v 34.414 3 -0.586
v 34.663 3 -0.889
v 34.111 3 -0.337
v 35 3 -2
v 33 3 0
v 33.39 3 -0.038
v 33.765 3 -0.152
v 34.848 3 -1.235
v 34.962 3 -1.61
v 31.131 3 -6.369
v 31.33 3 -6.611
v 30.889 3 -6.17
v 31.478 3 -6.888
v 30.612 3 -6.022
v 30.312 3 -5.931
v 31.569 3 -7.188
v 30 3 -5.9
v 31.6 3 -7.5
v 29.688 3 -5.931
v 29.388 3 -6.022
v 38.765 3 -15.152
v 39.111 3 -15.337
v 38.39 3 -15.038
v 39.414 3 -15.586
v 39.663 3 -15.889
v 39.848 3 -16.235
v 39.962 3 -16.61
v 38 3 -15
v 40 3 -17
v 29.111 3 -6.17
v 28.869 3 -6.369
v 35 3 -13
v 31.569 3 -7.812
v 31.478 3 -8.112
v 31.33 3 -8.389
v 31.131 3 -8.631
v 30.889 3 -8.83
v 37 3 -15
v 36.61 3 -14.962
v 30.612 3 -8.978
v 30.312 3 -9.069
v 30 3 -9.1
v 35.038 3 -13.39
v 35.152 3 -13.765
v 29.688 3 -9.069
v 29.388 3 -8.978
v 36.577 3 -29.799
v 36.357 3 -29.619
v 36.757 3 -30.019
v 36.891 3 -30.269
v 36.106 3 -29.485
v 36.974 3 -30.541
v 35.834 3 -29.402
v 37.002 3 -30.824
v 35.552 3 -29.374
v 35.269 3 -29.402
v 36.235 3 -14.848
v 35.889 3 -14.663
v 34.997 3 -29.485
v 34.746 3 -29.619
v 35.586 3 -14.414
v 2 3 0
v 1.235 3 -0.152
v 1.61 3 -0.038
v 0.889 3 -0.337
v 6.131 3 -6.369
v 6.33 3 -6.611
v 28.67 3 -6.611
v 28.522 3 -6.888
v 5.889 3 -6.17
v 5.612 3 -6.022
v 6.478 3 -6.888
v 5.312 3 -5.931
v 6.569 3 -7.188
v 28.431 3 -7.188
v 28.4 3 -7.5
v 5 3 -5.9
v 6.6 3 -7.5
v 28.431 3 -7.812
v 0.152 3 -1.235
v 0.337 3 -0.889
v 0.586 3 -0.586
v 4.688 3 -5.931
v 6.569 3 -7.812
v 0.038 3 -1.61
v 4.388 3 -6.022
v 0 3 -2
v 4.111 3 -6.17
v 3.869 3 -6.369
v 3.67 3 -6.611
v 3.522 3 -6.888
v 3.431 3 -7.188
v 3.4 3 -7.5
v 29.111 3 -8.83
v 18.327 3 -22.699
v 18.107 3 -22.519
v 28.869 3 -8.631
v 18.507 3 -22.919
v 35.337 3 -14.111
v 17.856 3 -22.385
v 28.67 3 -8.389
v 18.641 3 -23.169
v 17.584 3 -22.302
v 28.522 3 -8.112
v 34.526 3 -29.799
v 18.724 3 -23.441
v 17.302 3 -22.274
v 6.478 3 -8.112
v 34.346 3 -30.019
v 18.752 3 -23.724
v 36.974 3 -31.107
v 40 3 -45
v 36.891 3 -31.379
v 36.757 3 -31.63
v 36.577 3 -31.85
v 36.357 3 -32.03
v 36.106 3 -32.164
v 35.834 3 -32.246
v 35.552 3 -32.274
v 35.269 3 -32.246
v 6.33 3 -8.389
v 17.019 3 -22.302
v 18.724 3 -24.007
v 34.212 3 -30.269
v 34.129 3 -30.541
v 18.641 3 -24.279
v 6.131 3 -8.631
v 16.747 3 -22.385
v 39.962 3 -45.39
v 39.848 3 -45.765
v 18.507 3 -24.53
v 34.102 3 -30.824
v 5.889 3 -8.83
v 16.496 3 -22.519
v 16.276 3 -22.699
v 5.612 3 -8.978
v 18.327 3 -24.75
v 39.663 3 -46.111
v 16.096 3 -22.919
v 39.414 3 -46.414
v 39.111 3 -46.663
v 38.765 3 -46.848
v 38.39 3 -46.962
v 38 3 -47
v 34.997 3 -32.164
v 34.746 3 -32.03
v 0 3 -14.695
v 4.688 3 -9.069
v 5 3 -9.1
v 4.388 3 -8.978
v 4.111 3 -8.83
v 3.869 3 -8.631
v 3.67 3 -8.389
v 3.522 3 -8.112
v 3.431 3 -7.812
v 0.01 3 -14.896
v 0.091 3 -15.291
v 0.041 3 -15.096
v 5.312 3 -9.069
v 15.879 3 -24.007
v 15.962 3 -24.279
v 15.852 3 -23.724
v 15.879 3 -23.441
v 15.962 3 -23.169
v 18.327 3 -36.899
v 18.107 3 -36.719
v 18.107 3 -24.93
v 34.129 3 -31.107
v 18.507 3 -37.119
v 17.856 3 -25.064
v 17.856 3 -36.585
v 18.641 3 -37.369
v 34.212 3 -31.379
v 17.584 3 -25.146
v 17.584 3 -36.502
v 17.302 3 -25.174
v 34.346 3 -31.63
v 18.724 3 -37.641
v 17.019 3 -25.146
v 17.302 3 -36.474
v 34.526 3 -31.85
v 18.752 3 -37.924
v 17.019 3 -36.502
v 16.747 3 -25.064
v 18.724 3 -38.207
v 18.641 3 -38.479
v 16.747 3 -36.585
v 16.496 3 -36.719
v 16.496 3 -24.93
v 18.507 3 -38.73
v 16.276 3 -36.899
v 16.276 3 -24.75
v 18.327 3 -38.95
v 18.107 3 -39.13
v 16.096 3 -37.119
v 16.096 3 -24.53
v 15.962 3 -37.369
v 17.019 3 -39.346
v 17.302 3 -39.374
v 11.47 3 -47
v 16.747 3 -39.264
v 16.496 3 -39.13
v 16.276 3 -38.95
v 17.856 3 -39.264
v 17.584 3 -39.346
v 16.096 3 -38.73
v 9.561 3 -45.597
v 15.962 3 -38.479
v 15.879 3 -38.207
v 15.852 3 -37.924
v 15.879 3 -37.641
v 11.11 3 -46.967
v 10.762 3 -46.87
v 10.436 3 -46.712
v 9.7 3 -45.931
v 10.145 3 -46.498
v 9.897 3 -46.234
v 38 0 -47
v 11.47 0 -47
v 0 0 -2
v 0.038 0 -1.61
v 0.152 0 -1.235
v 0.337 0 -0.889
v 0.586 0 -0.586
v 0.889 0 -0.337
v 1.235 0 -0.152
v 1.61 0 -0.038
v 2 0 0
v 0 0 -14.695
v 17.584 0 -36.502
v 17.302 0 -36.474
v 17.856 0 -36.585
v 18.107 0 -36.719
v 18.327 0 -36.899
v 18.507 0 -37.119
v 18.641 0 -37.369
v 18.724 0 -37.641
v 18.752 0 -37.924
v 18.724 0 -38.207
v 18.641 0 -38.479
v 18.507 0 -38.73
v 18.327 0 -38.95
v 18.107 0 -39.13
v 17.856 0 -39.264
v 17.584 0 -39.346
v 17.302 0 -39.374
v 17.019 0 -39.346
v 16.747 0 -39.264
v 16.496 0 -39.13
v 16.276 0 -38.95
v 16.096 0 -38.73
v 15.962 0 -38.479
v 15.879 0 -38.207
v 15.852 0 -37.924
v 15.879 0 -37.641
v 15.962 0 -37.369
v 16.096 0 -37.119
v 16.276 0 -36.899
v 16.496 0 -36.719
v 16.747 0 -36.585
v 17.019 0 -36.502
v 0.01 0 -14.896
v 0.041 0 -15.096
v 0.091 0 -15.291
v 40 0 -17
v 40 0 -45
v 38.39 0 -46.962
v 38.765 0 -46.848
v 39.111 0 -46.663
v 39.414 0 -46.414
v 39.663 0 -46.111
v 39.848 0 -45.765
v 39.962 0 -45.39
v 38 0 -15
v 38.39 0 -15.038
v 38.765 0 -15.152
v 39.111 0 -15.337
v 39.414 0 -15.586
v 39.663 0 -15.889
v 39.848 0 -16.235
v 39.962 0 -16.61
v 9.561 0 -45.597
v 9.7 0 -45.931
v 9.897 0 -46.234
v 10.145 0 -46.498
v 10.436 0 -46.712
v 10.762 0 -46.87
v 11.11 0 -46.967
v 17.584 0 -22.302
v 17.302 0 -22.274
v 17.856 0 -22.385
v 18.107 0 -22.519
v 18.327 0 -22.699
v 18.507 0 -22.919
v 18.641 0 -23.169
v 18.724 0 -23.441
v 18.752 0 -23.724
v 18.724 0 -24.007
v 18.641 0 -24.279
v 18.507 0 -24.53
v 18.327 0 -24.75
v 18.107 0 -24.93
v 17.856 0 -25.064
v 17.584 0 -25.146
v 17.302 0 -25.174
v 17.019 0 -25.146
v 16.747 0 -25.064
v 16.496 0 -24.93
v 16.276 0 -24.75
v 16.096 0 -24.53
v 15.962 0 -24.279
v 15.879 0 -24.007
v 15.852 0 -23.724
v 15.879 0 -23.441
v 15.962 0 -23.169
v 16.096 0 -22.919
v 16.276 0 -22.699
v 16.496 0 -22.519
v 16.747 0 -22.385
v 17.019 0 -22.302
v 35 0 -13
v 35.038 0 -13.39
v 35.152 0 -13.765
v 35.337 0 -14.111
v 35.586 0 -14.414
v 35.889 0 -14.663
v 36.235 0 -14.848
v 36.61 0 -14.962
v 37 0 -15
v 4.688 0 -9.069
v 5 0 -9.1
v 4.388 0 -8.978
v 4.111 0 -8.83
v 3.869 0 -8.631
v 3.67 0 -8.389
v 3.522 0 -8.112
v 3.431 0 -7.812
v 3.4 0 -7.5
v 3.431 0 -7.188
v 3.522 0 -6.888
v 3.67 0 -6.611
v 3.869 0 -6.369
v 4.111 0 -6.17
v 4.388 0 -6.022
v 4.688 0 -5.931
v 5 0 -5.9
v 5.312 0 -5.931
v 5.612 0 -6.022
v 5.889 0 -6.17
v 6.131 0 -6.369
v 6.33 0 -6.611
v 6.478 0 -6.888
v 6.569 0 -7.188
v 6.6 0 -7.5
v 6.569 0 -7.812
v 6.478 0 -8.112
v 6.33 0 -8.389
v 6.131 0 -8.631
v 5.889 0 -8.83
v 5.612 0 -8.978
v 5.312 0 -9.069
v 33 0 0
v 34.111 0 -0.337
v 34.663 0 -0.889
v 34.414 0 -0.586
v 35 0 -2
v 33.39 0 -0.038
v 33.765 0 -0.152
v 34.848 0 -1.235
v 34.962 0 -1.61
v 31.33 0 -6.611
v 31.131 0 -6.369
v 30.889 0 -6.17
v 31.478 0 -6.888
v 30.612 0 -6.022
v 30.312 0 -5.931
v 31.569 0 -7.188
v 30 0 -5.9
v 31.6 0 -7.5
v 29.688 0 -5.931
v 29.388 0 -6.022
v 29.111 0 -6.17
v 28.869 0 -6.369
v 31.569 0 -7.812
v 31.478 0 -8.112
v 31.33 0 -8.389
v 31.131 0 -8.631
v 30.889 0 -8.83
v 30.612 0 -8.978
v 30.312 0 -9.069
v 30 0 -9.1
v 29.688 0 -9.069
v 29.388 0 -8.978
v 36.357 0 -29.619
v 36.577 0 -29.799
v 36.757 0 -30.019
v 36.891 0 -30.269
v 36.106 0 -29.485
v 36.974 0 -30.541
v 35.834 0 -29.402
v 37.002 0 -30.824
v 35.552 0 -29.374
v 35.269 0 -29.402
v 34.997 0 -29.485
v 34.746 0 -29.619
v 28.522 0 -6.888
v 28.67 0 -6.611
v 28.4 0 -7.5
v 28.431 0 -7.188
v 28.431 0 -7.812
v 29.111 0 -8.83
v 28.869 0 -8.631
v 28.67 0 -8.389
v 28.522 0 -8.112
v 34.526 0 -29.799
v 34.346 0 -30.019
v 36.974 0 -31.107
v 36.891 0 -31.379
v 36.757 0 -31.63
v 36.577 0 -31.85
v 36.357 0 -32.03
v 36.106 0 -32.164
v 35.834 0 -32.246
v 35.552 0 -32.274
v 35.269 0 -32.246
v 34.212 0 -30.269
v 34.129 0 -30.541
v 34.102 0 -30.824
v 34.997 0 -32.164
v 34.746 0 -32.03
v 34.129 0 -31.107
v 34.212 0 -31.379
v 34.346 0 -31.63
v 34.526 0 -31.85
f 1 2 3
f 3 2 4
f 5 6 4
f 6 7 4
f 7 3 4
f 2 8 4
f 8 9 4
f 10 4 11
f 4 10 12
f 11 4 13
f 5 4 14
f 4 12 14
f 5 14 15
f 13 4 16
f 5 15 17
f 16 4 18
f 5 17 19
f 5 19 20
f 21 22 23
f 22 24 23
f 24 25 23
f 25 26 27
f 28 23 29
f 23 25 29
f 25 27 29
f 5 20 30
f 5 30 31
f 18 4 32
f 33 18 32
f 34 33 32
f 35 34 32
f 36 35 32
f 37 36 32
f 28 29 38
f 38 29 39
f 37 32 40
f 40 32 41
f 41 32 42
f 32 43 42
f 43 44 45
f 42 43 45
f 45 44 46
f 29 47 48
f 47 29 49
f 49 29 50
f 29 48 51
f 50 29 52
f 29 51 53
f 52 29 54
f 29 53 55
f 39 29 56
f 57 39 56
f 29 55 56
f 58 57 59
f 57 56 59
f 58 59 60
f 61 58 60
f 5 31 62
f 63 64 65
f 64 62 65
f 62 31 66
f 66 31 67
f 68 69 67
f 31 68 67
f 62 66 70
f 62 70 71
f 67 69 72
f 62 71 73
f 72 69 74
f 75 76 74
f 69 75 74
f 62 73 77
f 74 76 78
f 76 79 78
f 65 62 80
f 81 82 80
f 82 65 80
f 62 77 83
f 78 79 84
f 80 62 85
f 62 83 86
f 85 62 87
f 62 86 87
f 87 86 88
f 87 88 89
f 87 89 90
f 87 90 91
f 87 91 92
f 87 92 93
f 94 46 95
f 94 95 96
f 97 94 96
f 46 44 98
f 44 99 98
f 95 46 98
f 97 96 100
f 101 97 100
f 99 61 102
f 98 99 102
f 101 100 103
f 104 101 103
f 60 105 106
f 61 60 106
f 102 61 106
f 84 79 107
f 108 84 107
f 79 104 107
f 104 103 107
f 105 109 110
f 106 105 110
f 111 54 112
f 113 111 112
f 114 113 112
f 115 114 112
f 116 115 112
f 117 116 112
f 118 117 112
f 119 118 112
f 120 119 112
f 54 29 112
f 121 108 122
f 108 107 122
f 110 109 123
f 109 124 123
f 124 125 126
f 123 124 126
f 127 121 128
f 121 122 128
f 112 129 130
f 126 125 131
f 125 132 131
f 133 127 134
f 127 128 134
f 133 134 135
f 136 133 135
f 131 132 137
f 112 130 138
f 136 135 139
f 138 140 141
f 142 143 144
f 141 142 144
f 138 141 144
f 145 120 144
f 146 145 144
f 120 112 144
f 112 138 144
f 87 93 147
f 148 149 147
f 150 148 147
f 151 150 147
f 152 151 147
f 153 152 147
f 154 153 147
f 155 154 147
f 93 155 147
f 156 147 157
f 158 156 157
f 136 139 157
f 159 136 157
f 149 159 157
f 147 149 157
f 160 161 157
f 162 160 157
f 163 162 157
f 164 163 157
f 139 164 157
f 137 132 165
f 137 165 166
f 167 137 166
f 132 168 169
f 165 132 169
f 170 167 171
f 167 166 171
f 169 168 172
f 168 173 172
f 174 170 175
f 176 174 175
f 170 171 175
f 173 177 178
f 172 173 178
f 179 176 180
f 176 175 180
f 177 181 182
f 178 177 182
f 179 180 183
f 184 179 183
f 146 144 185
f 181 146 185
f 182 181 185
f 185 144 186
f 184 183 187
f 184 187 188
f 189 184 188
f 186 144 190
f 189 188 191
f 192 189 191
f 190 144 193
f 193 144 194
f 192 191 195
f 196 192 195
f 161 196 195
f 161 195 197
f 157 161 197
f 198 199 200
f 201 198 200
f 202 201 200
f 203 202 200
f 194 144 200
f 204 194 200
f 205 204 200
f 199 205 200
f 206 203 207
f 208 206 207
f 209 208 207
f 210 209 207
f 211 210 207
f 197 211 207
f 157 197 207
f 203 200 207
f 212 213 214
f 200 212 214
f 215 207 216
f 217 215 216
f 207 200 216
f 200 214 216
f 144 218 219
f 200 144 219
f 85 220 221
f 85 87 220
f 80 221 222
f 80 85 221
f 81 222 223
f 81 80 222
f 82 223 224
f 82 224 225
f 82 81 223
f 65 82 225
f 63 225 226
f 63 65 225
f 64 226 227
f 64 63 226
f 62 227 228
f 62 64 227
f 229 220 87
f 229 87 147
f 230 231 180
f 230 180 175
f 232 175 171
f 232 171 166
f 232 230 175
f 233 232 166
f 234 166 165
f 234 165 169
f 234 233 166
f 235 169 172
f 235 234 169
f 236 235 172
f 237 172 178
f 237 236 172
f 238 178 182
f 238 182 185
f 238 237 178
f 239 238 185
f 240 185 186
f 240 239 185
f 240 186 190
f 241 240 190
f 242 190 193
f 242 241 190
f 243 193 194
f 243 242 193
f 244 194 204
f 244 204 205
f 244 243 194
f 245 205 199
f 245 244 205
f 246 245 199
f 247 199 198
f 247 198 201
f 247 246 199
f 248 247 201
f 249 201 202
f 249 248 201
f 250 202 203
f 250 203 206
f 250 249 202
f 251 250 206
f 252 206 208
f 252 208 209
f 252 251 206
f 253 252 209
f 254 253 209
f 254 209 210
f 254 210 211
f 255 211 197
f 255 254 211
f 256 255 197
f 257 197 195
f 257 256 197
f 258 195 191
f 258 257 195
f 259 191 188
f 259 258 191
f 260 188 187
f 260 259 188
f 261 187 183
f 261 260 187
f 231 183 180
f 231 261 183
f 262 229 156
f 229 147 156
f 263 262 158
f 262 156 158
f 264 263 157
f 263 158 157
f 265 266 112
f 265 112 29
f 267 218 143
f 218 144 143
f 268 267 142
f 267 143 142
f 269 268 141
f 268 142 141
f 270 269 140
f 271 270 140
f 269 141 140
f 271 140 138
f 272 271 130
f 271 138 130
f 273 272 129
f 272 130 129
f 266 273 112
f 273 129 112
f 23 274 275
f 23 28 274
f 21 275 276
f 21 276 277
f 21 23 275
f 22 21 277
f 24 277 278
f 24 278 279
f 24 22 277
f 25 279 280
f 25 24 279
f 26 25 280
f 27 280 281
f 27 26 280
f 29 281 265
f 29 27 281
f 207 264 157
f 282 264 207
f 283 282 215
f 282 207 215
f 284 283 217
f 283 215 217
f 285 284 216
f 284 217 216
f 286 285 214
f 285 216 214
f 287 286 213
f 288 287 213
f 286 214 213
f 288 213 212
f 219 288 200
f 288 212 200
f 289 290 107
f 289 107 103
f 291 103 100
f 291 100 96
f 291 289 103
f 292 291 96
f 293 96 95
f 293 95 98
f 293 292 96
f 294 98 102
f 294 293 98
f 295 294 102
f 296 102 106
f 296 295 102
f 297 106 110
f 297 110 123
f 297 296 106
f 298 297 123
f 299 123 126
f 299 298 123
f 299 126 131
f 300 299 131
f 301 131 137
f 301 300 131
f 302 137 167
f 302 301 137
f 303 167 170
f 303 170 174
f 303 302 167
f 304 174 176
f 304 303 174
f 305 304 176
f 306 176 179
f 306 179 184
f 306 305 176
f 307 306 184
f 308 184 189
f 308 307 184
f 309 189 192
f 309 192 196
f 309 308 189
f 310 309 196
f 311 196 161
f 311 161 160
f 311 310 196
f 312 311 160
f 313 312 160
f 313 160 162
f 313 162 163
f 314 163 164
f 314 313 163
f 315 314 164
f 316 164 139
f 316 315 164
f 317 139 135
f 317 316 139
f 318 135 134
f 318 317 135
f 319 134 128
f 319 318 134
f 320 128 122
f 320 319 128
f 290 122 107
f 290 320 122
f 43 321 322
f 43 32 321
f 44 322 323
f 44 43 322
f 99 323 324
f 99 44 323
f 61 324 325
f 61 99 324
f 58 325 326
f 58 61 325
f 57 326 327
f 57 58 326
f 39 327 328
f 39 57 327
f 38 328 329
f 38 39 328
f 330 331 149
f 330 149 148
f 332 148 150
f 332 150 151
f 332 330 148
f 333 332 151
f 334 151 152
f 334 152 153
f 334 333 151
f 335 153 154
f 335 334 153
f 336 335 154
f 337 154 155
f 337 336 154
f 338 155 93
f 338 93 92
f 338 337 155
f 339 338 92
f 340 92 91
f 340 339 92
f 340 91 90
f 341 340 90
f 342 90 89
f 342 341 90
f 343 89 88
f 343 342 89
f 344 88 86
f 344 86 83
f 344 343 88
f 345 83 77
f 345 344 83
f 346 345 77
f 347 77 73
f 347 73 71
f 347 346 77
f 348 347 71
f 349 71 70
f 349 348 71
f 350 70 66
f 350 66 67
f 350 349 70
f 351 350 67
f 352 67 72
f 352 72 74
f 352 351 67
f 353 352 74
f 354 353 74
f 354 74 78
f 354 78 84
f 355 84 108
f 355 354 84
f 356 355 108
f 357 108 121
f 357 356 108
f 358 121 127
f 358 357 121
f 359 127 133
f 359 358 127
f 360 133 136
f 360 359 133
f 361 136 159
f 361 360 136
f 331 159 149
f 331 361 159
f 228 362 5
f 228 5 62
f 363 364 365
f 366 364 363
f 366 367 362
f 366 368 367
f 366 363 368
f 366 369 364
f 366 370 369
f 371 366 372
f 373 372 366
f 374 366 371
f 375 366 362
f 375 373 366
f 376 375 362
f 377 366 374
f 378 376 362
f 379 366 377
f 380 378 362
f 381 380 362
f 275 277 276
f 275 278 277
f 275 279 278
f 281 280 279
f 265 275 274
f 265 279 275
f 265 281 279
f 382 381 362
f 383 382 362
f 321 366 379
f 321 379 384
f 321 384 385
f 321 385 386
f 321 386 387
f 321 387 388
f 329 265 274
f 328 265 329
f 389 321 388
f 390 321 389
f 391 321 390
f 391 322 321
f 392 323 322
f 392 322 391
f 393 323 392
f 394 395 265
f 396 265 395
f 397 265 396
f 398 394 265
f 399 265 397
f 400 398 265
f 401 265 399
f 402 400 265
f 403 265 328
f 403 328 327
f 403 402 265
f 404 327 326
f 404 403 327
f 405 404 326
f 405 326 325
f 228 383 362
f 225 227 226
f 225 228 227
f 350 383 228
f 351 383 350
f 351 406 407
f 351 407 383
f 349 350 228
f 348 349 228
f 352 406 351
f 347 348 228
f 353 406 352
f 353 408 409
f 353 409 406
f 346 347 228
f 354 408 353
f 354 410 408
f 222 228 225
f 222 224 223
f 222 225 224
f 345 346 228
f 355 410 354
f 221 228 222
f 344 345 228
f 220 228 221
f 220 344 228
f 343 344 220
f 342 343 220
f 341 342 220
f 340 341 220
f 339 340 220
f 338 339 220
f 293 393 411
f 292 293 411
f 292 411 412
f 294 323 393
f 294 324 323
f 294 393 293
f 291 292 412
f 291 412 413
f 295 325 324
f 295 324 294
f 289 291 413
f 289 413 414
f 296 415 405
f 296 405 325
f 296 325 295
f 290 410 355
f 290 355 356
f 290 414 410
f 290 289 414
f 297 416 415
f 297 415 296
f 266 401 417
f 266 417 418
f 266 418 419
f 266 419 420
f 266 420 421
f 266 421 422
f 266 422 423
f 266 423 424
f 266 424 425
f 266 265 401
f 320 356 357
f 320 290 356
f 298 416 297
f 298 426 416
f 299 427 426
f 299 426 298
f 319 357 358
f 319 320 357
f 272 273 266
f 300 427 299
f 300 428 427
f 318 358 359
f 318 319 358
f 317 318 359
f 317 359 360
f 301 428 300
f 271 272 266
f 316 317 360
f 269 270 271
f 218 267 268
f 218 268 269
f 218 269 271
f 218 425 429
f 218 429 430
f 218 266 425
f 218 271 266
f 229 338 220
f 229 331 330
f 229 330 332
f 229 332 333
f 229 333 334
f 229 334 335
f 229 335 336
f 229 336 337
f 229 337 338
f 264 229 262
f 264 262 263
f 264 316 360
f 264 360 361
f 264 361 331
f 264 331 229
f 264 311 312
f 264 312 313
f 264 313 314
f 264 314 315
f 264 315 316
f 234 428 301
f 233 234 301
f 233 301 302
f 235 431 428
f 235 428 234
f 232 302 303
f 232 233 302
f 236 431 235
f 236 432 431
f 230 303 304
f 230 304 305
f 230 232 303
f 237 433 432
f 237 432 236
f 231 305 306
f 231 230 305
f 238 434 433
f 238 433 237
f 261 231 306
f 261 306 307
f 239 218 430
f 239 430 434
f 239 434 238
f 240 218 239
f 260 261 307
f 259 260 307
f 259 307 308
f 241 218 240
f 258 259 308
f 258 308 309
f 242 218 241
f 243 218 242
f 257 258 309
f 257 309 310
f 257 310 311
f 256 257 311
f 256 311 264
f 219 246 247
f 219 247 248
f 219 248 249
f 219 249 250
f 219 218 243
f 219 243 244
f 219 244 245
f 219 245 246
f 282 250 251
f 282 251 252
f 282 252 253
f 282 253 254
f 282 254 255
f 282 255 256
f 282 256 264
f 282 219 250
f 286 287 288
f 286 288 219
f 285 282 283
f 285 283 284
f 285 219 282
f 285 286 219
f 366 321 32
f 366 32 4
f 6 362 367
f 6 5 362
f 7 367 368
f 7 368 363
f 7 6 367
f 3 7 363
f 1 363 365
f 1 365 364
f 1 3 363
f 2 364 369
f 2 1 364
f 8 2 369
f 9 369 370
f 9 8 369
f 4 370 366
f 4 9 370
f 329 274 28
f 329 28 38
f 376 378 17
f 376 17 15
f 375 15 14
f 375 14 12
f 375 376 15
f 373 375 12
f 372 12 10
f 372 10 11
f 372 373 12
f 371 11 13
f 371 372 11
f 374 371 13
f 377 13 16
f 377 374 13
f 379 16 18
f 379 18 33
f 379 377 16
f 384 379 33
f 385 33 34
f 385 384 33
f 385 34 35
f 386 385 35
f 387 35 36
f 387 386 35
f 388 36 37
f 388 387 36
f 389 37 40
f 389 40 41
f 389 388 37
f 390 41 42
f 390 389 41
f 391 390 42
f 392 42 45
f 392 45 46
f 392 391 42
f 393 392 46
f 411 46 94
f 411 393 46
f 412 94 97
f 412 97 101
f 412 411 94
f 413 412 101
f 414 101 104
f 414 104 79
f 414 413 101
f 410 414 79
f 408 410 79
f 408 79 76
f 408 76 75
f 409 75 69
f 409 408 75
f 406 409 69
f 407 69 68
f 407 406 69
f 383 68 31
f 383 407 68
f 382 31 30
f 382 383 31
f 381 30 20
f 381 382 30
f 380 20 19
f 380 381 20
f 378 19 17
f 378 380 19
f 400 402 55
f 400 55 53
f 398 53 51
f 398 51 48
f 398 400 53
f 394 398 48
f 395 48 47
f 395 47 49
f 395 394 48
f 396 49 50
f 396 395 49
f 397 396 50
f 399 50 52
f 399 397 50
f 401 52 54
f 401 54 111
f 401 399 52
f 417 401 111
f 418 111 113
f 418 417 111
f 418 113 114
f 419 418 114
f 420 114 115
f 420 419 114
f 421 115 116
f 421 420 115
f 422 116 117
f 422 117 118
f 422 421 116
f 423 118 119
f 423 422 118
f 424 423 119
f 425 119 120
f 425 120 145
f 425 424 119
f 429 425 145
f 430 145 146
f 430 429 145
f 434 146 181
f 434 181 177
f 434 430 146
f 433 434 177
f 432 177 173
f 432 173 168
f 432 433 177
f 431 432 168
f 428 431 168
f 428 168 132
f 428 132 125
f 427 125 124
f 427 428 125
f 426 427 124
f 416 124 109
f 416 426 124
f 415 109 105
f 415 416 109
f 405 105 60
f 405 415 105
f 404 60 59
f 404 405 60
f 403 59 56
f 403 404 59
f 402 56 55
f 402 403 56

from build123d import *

# Parameters (mm, degrees)
SKETCH_1_R      = 1.6
SKETCH_1_R_2    = 1.45
EXTRUDE_1_DEPTH = 3
FILLET_2_R      = 2


with BuildPart() as part:
    # 草图1 → 凸台-拉伸1 (new body)
    with BuildSketch(Plane(origin=(0, 0, 0), x_dir=(1, 0, 0), z_dir=(0, 1, 0))):
        Polygon((0, 0), (0, 15), (10, 47), (25, 47), (40, 47), (40, 15), (35, 15), (35, 0), align=None)
        with Locations(Location((30, 7.5, 0), (0, 0, 270))):
            Circle(SKETCH_1_R, mode=Mode.SUBTRACT)
        with Locations(Location((5, 7.5, 0), (0, 0, 90))):
            Circle(SKETCH_1_R, mode=Mode.SUBTRACT)
        with Locations(Location((35.551575044, 30.824296308, 0), (0, 0, 270))):
            Circle(SKETCH_1_R_2, mode=Mode.SUBTRACT)
        with Locations(Location((17.301575044, 37.924296308, 0), (0, 0, 270))):
            Circle(SKETCH_1_R_2, mode=Mode.SUBTRACT)
        with Locations(Location((17.301575044, 23.724296308, 0), (0, 0, 270))):
            Circle(SKETCH_1_R_2, mode=Mode.SUBTRACT)
    extrude(amount=EXTRUDE_1_DEPTH)

    # 圆角2
    fillet_2_edges = [part.edges().sort_by_distance(p)[0] for p in [
        (35, 1.5, -15),
        (35, 1.5, 0),
        (0, 1.5, 0),
        (0, 1.5, -15),
        (10, 1.5, -47),
        (40, 1.5, -47),
        (40, 1.5, -15),
    ]]
    fillet(fillet_2_edges, radius=FILLET_2_R)


solid = part.part
